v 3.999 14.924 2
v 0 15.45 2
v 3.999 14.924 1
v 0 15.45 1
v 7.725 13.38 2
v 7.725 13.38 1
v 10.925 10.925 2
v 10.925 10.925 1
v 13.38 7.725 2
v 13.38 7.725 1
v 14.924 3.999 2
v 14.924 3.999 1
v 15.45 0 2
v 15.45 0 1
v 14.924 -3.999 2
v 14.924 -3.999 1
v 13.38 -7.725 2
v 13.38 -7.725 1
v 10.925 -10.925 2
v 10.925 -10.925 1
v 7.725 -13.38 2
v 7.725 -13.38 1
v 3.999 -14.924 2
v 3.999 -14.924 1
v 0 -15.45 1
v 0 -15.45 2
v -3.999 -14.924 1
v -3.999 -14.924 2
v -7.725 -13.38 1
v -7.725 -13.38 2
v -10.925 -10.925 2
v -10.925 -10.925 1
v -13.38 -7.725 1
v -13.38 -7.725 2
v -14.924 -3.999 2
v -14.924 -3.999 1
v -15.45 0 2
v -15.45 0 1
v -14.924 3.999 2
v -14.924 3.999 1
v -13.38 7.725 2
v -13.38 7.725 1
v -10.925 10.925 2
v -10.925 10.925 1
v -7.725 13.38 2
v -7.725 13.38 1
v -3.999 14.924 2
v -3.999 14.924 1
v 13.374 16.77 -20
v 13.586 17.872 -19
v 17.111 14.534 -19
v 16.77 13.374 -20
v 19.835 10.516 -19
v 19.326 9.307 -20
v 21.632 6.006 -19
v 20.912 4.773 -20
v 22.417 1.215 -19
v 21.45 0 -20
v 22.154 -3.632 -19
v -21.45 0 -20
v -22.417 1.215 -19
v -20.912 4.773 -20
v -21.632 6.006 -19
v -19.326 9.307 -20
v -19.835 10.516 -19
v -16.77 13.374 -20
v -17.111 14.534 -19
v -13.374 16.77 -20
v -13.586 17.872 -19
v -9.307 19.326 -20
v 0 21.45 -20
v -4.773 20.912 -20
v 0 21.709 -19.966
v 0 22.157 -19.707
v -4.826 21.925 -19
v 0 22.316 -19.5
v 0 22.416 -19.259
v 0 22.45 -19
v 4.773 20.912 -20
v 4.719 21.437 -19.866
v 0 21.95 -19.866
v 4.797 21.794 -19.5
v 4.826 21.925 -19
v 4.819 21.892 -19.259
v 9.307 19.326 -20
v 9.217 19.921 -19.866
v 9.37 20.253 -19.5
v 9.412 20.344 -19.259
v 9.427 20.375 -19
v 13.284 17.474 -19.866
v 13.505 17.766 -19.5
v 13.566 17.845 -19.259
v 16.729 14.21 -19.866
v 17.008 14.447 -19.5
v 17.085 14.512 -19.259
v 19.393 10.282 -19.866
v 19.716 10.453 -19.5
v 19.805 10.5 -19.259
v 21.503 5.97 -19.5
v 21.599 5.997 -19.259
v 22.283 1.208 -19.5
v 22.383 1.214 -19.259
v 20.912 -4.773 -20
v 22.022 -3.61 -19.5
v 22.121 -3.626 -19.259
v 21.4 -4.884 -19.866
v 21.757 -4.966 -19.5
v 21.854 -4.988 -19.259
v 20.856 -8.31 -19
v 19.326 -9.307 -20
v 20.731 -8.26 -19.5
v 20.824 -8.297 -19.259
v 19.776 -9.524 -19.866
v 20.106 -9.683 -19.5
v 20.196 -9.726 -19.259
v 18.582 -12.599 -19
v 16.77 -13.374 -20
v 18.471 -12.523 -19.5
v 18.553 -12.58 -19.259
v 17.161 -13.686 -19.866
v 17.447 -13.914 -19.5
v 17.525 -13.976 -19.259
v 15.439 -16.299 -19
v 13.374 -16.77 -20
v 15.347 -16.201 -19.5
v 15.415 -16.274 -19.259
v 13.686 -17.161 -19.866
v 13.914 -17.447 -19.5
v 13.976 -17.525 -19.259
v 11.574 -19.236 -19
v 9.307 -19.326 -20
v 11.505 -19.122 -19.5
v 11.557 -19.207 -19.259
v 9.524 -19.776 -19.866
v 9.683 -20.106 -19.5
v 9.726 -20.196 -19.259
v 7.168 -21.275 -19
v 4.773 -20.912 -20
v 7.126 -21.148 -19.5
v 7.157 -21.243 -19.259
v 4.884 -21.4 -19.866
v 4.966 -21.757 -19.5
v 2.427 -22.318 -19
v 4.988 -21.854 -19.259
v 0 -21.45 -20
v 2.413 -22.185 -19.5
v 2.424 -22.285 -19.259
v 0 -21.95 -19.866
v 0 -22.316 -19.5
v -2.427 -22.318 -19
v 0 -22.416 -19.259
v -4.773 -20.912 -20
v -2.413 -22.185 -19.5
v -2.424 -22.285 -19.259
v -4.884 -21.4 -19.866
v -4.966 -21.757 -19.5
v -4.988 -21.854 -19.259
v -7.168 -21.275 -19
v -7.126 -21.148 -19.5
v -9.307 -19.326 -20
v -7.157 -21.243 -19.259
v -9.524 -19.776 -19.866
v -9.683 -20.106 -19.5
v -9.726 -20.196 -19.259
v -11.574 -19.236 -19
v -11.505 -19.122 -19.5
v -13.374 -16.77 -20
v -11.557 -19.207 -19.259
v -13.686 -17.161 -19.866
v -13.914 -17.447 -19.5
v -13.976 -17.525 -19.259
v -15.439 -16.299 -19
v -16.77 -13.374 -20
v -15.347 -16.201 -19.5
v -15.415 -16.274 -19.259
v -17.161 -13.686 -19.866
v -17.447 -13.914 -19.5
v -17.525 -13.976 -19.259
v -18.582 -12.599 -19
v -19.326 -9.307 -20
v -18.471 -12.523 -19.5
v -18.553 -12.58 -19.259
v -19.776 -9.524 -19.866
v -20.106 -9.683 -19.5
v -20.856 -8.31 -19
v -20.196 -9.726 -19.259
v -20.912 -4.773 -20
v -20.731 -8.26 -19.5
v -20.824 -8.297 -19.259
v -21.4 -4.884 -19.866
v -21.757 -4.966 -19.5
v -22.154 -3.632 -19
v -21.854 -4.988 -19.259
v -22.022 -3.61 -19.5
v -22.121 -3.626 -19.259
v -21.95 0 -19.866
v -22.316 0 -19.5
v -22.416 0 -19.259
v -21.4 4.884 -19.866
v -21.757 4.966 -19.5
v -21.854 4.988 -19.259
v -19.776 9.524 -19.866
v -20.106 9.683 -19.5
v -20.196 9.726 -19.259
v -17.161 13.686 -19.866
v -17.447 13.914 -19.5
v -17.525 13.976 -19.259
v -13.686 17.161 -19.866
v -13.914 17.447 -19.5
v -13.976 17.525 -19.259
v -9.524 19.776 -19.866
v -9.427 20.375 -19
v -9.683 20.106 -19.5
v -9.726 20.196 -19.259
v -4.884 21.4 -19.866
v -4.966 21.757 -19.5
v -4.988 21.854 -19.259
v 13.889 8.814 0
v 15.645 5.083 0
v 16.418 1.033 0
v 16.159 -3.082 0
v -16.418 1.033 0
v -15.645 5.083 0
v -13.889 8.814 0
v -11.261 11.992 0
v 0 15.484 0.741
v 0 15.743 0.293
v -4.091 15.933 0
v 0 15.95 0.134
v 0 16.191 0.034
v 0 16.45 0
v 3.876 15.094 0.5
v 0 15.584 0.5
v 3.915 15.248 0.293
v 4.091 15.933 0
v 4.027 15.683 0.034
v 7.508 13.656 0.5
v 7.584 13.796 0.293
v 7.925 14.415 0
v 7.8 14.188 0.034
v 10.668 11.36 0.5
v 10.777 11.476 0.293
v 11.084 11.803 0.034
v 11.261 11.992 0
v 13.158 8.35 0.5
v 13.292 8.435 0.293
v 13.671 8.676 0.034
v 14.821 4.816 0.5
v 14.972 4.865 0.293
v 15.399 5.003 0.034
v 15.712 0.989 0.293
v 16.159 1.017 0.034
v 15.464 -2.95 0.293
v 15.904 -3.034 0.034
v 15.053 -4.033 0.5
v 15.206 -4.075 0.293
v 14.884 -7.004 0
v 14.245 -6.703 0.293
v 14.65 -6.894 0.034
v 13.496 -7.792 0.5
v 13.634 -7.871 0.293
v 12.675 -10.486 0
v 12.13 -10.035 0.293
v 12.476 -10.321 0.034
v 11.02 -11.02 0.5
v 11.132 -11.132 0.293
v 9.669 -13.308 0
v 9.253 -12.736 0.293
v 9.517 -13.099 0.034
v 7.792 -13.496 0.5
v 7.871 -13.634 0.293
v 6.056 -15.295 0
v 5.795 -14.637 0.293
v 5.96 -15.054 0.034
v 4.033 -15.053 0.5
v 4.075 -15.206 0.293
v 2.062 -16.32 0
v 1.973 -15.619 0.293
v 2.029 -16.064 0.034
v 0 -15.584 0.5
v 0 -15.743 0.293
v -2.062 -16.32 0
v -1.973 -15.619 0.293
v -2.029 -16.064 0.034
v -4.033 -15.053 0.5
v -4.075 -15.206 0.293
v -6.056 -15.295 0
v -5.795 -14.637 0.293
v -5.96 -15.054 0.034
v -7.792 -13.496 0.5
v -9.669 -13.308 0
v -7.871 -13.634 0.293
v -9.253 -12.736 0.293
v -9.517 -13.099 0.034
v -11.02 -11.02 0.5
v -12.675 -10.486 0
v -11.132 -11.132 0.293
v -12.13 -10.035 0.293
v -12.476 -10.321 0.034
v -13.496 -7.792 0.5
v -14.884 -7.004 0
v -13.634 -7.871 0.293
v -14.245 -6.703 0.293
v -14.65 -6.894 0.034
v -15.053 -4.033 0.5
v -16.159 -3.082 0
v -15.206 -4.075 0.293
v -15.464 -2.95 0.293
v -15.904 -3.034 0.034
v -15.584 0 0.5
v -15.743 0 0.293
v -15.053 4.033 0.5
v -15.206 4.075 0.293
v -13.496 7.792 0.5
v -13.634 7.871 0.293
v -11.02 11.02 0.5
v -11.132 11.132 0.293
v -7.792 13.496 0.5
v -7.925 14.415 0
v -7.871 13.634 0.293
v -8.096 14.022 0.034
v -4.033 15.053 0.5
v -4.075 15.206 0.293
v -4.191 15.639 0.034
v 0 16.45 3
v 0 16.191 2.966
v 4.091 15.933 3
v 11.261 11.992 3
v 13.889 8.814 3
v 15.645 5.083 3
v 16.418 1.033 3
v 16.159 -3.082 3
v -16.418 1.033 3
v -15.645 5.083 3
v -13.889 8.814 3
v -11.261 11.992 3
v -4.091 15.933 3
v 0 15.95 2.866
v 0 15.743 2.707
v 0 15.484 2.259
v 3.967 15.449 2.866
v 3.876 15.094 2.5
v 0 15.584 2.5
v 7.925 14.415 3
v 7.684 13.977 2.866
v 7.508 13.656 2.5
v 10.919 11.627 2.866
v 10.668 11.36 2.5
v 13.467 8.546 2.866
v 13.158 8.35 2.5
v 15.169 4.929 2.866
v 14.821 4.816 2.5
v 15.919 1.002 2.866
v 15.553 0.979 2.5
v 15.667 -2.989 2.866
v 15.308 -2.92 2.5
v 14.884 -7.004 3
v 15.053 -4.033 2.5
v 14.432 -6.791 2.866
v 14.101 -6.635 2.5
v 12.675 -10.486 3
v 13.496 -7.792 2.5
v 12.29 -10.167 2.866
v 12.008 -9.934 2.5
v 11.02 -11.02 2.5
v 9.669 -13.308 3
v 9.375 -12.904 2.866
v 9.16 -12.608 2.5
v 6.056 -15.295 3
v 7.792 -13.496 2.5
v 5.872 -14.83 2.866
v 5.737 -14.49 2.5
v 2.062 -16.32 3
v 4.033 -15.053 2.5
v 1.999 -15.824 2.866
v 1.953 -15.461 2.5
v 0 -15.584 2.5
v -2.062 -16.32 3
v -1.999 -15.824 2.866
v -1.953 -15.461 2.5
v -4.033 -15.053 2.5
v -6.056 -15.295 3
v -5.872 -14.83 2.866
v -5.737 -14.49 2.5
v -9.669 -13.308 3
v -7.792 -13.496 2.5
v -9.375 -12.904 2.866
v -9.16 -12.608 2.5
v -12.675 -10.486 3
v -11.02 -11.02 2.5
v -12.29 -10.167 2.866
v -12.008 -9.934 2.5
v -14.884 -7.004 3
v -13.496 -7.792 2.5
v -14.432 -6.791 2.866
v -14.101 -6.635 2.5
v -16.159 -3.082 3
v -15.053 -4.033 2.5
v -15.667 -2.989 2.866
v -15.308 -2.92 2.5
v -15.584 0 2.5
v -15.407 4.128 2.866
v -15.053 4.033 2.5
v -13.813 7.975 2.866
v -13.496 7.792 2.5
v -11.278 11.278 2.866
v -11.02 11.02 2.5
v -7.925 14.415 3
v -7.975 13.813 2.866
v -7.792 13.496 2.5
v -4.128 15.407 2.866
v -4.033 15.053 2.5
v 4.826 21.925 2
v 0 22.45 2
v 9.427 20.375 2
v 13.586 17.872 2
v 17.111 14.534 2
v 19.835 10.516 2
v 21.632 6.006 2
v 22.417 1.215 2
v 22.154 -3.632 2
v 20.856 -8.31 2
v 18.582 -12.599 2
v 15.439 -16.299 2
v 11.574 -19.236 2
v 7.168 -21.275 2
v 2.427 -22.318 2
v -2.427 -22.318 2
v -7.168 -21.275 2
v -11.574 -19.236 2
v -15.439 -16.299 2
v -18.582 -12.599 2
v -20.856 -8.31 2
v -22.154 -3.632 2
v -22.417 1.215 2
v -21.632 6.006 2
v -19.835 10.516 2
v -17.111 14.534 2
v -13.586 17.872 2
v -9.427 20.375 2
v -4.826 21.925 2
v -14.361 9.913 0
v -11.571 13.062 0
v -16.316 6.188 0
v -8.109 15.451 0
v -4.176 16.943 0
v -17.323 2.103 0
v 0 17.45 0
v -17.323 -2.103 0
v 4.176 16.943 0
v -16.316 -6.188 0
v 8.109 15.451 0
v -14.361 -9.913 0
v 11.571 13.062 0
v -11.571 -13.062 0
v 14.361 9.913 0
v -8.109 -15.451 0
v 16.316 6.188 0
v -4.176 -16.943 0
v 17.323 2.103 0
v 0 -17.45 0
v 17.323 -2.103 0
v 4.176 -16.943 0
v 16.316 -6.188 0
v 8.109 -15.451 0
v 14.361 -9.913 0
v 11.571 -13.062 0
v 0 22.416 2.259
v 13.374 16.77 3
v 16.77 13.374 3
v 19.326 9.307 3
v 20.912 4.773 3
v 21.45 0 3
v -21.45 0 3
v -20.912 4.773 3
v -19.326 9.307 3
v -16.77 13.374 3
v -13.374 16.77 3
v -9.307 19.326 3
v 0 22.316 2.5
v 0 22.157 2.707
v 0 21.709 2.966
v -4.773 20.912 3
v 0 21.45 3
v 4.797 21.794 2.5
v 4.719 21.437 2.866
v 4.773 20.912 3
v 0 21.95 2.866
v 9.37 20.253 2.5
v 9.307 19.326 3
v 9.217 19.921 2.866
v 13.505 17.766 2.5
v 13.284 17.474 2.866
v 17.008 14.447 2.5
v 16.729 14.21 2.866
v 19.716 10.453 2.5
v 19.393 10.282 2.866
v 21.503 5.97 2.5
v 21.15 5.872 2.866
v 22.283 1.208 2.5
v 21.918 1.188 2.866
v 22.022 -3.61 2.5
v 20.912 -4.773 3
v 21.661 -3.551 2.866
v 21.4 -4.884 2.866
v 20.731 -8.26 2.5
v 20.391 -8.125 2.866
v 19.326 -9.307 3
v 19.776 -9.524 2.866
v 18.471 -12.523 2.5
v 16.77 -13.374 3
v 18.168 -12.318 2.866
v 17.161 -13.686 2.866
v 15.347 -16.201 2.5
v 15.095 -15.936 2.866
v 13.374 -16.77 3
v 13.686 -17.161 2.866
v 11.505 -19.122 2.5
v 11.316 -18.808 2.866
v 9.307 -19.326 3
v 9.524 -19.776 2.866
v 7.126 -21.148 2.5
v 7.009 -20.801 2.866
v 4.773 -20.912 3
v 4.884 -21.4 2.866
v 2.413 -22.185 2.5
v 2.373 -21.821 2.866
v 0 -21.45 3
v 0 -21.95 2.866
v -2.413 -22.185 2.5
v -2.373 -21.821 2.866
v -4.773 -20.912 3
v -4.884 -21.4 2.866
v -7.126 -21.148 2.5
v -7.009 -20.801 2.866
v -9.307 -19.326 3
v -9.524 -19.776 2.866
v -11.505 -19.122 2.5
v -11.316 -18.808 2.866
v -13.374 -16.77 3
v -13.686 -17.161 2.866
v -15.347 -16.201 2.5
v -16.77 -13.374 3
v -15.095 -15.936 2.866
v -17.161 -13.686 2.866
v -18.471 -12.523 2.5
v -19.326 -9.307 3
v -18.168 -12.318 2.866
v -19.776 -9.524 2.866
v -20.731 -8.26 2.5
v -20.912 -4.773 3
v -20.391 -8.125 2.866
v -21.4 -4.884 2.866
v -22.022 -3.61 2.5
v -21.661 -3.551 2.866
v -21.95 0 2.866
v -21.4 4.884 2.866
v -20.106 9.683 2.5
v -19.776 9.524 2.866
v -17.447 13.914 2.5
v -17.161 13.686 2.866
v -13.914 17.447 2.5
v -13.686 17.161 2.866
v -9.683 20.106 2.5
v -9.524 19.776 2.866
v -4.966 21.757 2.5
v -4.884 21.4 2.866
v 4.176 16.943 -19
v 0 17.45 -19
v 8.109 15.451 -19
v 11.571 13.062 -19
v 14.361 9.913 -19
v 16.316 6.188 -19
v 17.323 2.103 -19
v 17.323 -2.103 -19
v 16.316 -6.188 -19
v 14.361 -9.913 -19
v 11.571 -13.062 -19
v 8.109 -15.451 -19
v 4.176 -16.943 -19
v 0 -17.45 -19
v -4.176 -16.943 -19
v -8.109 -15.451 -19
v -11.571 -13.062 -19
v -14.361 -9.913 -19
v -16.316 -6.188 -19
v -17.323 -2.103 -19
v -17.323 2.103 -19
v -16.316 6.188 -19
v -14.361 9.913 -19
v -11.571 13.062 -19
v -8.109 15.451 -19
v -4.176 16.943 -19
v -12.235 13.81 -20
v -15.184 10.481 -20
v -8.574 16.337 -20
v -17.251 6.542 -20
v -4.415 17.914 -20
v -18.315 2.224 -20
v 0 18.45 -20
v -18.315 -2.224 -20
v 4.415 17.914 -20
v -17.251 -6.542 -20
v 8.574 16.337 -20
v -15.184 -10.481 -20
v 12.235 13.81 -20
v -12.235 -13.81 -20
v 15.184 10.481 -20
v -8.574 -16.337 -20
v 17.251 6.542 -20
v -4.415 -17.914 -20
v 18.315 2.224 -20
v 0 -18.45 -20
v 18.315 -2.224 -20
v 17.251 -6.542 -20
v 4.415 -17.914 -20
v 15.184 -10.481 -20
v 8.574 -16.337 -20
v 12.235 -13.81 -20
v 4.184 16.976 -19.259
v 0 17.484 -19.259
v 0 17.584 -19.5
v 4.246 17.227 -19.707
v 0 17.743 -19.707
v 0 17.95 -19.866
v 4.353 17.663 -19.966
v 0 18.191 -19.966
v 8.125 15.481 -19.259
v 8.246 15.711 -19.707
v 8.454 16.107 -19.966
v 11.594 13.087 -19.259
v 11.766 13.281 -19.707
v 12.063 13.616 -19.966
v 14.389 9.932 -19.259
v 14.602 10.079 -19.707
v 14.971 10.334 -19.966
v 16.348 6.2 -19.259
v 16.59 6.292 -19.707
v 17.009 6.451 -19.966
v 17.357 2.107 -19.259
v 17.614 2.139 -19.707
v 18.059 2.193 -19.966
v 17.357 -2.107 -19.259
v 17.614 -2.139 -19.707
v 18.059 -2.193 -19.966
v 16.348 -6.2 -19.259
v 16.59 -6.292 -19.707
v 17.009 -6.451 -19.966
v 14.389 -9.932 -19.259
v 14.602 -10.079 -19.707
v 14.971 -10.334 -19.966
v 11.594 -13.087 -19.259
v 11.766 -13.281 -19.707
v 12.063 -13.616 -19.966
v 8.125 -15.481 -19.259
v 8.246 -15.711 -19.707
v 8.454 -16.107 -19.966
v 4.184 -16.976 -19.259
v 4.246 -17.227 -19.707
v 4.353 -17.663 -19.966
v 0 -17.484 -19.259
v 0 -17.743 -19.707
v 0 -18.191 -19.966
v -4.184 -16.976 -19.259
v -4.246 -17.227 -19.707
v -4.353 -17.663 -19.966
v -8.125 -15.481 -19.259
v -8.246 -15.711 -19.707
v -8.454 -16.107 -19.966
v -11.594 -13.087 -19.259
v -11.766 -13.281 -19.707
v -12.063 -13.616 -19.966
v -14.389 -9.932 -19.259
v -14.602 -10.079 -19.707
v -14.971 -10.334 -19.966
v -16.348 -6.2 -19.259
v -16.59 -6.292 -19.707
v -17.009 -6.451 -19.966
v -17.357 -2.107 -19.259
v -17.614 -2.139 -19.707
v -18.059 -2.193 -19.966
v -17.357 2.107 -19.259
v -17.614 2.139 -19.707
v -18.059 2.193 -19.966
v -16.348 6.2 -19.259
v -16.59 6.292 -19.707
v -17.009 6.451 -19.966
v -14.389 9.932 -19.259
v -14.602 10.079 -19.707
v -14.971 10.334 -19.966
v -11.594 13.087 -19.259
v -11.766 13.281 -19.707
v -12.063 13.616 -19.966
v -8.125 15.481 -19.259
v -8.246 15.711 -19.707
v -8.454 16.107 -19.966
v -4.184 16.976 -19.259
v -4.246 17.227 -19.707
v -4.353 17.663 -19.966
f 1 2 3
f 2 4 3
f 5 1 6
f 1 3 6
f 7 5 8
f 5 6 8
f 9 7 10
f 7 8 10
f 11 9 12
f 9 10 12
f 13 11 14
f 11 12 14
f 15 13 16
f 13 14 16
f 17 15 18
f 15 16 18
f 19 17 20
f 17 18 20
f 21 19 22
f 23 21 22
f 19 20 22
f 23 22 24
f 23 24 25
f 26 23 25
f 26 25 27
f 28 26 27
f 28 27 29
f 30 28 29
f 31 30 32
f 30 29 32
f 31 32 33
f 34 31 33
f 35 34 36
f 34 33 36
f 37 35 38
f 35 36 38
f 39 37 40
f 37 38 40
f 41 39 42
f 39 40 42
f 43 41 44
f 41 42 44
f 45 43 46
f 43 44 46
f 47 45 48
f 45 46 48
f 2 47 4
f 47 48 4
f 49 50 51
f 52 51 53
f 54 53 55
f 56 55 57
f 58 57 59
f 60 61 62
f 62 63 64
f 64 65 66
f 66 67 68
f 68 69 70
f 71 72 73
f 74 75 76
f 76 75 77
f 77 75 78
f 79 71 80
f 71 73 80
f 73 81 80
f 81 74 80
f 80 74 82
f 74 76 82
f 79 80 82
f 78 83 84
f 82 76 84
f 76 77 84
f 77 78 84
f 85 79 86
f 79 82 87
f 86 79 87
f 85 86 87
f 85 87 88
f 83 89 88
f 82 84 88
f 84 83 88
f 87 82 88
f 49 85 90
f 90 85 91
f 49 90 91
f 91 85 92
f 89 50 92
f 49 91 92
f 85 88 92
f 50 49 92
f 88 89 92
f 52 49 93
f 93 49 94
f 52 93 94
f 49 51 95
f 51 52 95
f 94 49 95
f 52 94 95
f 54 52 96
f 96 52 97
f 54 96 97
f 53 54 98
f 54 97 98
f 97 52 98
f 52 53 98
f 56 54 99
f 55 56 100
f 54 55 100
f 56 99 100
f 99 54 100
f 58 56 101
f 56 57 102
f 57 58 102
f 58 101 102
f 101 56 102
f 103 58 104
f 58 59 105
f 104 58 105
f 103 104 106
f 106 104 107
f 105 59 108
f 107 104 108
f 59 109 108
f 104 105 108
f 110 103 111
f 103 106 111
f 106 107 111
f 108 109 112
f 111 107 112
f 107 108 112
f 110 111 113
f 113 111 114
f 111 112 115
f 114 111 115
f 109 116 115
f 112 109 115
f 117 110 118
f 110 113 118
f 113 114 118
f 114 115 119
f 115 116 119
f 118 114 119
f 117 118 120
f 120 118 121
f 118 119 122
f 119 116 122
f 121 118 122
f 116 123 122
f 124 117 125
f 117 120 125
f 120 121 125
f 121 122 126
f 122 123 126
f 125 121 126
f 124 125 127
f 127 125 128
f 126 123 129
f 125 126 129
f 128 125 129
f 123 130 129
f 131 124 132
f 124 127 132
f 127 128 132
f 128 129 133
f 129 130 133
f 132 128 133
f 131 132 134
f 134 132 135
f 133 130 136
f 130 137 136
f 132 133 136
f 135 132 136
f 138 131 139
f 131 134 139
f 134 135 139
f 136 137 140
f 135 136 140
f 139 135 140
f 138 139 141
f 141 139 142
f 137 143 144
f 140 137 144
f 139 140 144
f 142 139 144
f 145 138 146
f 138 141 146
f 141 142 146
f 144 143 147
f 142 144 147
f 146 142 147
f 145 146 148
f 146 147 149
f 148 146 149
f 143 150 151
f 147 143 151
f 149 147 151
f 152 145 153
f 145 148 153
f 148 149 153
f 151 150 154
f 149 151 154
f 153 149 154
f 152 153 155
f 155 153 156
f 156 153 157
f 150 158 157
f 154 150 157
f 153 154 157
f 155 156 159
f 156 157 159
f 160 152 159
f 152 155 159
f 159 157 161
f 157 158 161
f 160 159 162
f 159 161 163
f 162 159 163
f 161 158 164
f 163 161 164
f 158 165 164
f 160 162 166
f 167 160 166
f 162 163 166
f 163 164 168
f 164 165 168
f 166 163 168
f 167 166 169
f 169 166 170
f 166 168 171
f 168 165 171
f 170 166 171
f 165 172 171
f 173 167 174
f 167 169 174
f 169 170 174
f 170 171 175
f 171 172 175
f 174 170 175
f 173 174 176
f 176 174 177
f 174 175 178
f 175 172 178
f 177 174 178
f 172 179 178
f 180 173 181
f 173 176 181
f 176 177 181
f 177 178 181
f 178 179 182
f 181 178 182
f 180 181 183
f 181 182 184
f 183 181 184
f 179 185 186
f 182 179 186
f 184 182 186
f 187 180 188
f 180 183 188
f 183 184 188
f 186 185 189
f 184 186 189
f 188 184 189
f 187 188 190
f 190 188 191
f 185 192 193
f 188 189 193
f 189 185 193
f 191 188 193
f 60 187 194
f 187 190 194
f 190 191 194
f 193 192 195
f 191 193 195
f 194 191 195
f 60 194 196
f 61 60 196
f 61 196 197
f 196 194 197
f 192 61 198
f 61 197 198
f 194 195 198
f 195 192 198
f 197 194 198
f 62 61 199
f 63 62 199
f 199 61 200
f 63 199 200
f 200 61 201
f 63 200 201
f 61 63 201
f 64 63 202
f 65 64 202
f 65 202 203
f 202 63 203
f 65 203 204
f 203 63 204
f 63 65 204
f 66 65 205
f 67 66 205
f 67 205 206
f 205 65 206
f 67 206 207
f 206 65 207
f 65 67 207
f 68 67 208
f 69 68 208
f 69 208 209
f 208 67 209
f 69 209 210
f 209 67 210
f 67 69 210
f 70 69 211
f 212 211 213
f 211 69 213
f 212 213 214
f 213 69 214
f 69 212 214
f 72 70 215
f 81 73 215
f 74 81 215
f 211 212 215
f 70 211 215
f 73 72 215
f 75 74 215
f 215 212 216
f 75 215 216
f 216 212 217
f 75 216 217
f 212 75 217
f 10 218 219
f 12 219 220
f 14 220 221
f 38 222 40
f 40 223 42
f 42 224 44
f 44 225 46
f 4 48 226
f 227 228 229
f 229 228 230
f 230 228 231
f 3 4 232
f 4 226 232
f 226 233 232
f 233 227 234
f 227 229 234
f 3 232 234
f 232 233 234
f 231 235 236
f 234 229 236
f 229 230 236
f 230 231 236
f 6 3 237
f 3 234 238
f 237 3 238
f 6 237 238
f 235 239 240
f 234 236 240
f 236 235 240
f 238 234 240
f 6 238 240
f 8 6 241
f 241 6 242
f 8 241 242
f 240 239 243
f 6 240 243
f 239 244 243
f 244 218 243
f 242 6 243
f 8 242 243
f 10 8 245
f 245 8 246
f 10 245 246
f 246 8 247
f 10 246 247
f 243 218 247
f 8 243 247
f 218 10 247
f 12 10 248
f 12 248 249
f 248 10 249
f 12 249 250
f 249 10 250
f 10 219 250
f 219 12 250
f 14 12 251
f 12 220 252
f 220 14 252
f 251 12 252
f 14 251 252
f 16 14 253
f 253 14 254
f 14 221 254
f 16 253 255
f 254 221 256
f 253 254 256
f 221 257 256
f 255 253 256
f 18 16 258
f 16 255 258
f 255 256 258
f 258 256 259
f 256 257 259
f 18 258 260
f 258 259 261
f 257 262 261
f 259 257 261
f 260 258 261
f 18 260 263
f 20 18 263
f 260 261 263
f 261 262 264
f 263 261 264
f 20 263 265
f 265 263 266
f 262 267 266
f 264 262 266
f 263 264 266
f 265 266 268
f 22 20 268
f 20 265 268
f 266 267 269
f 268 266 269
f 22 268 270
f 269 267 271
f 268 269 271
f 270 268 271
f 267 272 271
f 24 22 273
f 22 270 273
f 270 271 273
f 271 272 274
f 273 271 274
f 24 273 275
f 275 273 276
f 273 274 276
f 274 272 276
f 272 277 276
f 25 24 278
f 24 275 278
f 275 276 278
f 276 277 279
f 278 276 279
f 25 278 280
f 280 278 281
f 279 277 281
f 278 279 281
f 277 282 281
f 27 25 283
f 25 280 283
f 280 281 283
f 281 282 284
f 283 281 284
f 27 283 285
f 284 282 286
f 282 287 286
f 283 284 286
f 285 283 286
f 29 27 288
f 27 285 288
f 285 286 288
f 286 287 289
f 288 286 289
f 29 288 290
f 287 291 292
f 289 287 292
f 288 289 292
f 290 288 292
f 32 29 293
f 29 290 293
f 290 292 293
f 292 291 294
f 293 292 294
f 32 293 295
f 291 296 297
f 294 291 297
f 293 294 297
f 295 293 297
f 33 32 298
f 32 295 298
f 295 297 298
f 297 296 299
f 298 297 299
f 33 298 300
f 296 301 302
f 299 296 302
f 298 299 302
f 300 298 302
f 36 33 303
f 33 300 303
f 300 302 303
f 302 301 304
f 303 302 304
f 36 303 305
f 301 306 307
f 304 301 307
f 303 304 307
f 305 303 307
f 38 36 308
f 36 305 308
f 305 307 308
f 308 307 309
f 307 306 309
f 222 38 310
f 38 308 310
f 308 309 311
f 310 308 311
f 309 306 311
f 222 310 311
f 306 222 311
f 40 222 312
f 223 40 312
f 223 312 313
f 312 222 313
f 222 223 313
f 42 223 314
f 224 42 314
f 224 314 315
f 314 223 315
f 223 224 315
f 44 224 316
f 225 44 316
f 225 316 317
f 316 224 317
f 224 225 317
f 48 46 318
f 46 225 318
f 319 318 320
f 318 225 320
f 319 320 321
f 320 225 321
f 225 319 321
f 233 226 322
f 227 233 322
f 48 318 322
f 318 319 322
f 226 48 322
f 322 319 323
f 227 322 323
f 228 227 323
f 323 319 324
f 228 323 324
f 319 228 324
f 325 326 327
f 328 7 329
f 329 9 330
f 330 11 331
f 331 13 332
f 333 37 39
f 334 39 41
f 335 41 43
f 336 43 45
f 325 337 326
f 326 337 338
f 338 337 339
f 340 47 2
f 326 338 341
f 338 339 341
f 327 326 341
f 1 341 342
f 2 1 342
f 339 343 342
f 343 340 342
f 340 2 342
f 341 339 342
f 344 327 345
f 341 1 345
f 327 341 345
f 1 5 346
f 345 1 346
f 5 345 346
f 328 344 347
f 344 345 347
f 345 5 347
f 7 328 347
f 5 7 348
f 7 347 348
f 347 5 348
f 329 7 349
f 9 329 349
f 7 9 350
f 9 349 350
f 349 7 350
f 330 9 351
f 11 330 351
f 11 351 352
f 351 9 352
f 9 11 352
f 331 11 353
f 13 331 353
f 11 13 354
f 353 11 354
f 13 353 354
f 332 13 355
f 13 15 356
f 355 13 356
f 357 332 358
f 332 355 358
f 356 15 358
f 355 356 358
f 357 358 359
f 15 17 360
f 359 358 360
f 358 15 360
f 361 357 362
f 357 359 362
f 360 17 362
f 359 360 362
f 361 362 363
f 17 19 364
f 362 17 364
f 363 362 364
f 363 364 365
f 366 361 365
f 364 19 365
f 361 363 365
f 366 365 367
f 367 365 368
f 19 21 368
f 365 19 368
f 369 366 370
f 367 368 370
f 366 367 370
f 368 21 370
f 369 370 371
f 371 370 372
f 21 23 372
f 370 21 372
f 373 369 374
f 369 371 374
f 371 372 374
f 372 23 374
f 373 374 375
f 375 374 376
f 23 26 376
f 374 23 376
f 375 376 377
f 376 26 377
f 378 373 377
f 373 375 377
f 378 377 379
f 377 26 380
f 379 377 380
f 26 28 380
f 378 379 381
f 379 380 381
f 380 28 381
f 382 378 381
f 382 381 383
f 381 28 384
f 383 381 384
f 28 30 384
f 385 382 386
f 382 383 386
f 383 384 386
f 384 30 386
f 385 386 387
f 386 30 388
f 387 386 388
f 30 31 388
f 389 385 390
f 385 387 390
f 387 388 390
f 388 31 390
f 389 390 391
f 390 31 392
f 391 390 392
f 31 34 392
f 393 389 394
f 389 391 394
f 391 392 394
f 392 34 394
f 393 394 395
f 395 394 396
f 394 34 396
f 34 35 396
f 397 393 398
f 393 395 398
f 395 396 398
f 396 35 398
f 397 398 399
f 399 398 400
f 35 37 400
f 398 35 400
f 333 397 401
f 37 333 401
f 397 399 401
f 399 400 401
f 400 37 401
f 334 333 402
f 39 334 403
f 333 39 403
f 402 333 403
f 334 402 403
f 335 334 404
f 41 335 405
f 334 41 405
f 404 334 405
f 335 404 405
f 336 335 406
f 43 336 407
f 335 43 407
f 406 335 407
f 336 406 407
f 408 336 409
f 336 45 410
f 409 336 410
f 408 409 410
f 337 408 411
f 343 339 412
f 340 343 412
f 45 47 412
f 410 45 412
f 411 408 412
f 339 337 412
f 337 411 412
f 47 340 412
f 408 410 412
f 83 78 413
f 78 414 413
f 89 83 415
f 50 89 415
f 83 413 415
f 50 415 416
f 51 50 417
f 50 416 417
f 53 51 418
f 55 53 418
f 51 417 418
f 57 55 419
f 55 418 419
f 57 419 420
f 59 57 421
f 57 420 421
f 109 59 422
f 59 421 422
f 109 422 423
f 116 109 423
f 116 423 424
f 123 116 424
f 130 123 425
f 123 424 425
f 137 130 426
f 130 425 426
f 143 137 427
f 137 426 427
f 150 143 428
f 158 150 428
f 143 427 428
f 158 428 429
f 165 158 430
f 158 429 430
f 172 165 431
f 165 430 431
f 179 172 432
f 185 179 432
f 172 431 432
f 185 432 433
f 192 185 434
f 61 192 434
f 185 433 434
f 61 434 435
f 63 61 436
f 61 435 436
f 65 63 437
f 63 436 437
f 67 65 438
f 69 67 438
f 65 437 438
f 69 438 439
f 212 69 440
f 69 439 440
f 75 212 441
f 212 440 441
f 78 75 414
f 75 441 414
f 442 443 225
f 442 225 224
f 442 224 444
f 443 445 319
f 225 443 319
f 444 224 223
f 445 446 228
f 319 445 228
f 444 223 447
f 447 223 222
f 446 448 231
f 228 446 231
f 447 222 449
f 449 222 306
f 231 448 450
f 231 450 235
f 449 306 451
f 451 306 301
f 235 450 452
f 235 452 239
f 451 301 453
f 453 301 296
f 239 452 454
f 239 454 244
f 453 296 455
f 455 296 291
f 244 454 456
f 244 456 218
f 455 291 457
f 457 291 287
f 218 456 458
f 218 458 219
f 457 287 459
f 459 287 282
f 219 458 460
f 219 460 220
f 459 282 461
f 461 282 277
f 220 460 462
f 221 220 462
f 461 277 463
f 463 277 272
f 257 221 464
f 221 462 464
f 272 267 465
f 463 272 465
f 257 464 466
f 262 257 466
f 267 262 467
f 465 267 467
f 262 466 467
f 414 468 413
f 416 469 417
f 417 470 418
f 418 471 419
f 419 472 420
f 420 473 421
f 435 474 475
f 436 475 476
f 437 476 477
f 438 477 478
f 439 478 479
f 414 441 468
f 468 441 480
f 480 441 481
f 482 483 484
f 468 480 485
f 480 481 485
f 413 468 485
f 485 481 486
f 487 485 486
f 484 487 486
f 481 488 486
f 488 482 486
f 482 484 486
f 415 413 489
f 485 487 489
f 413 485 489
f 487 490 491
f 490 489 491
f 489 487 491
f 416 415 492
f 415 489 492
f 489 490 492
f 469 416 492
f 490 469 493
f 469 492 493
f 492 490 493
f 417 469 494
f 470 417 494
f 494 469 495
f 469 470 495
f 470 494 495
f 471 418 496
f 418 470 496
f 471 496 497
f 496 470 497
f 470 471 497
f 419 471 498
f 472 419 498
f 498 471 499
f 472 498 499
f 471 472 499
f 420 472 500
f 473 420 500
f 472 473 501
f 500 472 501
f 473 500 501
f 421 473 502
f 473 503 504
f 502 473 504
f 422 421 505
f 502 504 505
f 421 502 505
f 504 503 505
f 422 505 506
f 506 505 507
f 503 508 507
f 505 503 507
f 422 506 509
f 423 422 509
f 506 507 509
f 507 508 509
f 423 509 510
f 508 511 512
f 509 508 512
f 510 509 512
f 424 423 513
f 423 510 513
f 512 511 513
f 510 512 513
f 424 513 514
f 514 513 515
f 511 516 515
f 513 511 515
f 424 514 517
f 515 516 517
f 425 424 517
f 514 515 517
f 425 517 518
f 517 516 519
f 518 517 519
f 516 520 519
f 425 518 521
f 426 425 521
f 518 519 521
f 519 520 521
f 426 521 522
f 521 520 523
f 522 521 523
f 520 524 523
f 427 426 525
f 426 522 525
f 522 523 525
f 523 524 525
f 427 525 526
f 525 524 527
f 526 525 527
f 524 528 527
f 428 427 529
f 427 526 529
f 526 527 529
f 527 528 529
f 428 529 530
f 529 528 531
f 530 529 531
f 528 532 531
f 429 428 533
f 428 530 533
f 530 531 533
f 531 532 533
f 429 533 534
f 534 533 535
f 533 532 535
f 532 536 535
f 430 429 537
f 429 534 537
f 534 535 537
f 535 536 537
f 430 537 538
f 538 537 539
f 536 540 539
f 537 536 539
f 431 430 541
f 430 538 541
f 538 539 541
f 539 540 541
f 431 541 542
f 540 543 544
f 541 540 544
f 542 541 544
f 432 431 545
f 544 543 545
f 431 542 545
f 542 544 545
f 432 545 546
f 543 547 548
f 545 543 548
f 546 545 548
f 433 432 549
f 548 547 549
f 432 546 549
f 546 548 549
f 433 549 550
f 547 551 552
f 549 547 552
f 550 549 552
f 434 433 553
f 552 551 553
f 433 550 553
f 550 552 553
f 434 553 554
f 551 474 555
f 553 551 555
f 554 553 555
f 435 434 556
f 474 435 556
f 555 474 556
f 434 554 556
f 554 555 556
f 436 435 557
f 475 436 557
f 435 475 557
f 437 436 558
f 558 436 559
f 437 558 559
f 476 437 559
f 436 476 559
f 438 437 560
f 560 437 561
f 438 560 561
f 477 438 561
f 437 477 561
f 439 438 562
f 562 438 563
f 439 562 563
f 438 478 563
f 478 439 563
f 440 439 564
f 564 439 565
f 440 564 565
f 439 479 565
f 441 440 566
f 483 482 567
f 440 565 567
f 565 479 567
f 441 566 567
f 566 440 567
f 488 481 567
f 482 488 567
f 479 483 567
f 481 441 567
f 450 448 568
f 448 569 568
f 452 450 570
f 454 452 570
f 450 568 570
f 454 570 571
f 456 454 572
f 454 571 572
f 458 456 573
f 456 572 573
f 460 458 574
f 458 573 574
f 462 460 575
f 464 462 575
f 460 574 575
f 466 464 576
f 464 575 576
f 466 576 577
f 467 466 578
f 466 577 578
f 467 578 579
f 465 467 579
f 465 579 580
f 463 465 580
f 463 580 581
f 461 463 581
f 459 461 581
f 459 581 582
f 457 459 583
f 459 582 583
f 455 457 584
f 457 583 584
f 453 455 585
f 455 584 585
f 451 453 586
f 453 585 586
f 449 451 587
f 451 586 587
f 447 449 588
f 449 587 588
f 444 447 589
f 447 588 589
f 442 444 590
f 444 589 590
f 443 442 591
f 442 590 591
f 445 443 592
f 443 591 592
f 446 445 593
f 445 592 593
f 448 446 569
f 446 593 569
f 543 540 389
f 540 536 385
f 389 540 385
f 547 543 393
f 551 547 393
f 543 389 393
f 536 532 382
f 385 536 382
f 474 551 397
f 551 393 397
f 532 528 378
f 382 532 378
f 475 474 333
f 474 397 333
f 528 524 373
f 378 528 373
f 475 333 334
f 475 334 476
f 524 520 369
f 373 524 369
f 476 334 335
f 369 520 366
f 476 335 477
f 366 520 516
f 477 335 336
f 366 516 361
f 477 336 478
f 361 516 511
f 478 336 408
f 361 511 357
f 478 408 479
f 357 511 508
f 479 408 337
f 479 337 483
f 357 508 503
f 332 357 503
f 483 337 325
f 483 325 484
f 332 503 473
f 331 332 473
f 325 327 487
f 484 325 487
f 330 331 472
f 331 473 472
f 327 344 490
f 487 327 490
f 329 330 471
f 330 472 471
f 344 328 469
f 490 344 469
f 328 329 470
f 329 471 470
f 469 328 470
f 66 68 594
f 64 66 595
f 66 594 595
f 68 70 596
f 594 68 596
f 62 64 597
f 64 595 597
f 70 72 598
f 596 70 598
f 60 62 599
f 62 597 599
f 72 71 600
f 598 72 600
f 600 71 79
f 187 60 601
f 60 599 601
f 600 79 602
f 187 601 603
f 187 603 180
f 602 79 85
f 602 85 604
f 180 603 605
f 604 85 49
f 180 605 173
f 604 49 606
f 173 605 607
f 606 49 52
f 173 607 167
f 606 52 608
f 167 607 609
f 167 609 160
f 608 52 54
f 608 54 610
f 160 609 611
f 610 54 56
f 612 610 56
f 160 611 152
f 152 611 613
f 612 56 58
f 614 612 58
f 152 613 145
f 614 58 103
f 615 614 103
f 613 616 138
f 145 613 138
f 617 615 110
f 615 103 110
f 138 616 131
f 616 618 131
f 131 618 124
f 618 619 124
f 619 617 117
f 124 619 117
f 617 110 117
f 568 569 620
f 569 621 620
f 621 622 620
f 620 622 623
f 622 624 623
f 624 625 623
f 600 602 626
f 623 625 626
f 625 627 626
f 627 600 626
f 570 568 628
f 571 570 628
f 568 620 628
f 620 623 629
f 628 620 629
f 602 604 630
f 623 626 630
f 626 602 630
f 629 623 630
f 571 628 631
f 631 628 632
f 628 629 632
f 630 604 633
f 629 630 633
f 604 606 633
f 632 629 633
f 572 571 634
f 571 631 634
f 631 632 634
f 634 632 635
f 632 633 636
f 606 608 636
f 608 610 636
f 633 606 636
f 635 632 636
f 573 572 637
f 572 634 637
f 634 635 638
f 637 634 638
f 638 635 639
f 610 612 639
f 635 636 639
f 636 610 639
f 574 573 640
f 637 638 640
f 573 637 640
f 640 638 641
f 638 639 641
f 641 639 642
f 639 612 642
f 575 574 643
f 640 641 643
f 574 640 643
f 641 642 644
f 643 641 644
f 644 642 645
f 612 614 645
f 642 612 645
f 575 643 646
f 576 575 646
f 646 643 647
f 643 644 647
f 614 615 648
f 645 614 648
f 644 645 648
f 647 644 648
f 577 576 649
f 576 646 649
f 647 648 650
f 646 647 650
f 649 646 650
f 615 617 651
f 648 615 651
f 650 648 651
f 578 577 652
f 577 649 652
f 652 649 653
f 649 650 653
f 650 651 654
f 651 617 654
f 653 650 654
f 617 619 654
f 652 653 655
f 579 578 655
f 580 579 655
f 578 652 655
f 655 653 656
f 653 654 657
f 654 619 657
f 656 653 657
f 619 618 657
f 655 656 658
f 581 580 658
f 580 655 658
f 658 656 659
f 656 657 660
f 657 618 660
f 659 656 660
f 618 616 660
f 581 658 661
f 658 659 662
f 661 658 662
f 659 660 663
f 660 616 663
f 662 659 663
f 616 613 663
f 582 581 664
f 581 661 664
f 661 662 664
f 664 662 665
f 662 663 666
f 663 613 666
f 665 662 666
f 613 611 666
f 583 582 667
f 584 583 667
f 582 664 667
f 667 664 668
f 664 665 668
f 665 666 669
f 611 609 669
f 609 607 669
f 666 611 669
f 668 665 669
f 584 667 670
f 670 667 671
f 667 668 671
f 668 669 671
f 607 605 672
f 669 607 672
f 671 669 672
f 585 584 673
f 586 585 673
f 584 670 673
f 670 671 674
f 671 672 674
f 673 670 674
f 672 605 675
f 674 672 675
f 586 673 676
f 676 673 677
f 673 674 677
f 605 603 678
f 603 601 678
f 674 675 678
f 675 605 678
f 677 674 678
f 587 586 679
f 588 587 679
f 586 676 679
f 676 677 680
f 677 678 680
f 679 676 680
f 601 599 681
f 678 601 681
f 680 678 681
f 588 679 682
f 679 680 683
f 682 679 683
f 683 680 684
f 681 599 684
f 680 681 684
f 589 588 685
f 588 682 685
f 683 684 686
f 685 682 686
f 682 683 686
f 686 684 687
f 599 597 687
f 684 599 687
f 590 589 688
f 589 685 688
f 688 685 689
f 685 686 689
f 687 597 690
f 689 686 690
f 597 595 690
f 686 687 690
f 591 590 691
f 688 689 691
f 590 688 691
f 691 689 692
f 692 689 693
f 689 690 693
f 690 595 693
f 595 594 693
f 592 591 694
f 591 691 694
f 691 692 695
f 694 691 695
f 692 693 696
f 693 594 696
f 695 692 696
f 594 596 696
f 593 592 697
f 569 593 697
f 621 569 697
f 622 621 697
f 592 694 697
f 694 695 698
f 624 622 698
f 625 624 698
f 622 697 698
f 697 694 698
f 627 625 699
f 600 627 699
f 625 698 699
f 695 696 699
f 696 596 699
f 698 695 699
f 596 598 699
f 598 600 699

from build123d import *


with BuildPart() as f1:
    # F0 (on Right) → F1 (revolve)
    with BuildSketch(Plane.YZ):
        with BuildLine():
            Line((21.45, 3), (16.45, 3))
            ThreePointArc((16.45, 3), (15.7428932188, 2.7071067812), (15.45, 2))
            Line((15.45, 2), (15.45, 1))
            ThreePointArc((15.45, 1), (15.7428932188, 0.2928932188), (16.45, 0))
            Line((16.45, 0), (17.45, 0))
            Line((17.45, 0), (17.45, -19))
            ThreePointArc((17.45, -19), (17.7428932188, -19.7071067812), (18.45, -20))
            Line((18.45, -20), (21.45, -20))
            ThreePointArc((21.45, -20), (22.1571067812, -19.7071067812), (22.45, -19))
            Line((22.45, -19), (22.45, 2))
            ThreePointArc((22.45, 2), (22.1571067812, 2.7071067812), (21.45, 3))
        make_face()
    revolve(axis=Axis((0, 0, -3.255167976), (0, 0, -1)))


solid = f1.part
